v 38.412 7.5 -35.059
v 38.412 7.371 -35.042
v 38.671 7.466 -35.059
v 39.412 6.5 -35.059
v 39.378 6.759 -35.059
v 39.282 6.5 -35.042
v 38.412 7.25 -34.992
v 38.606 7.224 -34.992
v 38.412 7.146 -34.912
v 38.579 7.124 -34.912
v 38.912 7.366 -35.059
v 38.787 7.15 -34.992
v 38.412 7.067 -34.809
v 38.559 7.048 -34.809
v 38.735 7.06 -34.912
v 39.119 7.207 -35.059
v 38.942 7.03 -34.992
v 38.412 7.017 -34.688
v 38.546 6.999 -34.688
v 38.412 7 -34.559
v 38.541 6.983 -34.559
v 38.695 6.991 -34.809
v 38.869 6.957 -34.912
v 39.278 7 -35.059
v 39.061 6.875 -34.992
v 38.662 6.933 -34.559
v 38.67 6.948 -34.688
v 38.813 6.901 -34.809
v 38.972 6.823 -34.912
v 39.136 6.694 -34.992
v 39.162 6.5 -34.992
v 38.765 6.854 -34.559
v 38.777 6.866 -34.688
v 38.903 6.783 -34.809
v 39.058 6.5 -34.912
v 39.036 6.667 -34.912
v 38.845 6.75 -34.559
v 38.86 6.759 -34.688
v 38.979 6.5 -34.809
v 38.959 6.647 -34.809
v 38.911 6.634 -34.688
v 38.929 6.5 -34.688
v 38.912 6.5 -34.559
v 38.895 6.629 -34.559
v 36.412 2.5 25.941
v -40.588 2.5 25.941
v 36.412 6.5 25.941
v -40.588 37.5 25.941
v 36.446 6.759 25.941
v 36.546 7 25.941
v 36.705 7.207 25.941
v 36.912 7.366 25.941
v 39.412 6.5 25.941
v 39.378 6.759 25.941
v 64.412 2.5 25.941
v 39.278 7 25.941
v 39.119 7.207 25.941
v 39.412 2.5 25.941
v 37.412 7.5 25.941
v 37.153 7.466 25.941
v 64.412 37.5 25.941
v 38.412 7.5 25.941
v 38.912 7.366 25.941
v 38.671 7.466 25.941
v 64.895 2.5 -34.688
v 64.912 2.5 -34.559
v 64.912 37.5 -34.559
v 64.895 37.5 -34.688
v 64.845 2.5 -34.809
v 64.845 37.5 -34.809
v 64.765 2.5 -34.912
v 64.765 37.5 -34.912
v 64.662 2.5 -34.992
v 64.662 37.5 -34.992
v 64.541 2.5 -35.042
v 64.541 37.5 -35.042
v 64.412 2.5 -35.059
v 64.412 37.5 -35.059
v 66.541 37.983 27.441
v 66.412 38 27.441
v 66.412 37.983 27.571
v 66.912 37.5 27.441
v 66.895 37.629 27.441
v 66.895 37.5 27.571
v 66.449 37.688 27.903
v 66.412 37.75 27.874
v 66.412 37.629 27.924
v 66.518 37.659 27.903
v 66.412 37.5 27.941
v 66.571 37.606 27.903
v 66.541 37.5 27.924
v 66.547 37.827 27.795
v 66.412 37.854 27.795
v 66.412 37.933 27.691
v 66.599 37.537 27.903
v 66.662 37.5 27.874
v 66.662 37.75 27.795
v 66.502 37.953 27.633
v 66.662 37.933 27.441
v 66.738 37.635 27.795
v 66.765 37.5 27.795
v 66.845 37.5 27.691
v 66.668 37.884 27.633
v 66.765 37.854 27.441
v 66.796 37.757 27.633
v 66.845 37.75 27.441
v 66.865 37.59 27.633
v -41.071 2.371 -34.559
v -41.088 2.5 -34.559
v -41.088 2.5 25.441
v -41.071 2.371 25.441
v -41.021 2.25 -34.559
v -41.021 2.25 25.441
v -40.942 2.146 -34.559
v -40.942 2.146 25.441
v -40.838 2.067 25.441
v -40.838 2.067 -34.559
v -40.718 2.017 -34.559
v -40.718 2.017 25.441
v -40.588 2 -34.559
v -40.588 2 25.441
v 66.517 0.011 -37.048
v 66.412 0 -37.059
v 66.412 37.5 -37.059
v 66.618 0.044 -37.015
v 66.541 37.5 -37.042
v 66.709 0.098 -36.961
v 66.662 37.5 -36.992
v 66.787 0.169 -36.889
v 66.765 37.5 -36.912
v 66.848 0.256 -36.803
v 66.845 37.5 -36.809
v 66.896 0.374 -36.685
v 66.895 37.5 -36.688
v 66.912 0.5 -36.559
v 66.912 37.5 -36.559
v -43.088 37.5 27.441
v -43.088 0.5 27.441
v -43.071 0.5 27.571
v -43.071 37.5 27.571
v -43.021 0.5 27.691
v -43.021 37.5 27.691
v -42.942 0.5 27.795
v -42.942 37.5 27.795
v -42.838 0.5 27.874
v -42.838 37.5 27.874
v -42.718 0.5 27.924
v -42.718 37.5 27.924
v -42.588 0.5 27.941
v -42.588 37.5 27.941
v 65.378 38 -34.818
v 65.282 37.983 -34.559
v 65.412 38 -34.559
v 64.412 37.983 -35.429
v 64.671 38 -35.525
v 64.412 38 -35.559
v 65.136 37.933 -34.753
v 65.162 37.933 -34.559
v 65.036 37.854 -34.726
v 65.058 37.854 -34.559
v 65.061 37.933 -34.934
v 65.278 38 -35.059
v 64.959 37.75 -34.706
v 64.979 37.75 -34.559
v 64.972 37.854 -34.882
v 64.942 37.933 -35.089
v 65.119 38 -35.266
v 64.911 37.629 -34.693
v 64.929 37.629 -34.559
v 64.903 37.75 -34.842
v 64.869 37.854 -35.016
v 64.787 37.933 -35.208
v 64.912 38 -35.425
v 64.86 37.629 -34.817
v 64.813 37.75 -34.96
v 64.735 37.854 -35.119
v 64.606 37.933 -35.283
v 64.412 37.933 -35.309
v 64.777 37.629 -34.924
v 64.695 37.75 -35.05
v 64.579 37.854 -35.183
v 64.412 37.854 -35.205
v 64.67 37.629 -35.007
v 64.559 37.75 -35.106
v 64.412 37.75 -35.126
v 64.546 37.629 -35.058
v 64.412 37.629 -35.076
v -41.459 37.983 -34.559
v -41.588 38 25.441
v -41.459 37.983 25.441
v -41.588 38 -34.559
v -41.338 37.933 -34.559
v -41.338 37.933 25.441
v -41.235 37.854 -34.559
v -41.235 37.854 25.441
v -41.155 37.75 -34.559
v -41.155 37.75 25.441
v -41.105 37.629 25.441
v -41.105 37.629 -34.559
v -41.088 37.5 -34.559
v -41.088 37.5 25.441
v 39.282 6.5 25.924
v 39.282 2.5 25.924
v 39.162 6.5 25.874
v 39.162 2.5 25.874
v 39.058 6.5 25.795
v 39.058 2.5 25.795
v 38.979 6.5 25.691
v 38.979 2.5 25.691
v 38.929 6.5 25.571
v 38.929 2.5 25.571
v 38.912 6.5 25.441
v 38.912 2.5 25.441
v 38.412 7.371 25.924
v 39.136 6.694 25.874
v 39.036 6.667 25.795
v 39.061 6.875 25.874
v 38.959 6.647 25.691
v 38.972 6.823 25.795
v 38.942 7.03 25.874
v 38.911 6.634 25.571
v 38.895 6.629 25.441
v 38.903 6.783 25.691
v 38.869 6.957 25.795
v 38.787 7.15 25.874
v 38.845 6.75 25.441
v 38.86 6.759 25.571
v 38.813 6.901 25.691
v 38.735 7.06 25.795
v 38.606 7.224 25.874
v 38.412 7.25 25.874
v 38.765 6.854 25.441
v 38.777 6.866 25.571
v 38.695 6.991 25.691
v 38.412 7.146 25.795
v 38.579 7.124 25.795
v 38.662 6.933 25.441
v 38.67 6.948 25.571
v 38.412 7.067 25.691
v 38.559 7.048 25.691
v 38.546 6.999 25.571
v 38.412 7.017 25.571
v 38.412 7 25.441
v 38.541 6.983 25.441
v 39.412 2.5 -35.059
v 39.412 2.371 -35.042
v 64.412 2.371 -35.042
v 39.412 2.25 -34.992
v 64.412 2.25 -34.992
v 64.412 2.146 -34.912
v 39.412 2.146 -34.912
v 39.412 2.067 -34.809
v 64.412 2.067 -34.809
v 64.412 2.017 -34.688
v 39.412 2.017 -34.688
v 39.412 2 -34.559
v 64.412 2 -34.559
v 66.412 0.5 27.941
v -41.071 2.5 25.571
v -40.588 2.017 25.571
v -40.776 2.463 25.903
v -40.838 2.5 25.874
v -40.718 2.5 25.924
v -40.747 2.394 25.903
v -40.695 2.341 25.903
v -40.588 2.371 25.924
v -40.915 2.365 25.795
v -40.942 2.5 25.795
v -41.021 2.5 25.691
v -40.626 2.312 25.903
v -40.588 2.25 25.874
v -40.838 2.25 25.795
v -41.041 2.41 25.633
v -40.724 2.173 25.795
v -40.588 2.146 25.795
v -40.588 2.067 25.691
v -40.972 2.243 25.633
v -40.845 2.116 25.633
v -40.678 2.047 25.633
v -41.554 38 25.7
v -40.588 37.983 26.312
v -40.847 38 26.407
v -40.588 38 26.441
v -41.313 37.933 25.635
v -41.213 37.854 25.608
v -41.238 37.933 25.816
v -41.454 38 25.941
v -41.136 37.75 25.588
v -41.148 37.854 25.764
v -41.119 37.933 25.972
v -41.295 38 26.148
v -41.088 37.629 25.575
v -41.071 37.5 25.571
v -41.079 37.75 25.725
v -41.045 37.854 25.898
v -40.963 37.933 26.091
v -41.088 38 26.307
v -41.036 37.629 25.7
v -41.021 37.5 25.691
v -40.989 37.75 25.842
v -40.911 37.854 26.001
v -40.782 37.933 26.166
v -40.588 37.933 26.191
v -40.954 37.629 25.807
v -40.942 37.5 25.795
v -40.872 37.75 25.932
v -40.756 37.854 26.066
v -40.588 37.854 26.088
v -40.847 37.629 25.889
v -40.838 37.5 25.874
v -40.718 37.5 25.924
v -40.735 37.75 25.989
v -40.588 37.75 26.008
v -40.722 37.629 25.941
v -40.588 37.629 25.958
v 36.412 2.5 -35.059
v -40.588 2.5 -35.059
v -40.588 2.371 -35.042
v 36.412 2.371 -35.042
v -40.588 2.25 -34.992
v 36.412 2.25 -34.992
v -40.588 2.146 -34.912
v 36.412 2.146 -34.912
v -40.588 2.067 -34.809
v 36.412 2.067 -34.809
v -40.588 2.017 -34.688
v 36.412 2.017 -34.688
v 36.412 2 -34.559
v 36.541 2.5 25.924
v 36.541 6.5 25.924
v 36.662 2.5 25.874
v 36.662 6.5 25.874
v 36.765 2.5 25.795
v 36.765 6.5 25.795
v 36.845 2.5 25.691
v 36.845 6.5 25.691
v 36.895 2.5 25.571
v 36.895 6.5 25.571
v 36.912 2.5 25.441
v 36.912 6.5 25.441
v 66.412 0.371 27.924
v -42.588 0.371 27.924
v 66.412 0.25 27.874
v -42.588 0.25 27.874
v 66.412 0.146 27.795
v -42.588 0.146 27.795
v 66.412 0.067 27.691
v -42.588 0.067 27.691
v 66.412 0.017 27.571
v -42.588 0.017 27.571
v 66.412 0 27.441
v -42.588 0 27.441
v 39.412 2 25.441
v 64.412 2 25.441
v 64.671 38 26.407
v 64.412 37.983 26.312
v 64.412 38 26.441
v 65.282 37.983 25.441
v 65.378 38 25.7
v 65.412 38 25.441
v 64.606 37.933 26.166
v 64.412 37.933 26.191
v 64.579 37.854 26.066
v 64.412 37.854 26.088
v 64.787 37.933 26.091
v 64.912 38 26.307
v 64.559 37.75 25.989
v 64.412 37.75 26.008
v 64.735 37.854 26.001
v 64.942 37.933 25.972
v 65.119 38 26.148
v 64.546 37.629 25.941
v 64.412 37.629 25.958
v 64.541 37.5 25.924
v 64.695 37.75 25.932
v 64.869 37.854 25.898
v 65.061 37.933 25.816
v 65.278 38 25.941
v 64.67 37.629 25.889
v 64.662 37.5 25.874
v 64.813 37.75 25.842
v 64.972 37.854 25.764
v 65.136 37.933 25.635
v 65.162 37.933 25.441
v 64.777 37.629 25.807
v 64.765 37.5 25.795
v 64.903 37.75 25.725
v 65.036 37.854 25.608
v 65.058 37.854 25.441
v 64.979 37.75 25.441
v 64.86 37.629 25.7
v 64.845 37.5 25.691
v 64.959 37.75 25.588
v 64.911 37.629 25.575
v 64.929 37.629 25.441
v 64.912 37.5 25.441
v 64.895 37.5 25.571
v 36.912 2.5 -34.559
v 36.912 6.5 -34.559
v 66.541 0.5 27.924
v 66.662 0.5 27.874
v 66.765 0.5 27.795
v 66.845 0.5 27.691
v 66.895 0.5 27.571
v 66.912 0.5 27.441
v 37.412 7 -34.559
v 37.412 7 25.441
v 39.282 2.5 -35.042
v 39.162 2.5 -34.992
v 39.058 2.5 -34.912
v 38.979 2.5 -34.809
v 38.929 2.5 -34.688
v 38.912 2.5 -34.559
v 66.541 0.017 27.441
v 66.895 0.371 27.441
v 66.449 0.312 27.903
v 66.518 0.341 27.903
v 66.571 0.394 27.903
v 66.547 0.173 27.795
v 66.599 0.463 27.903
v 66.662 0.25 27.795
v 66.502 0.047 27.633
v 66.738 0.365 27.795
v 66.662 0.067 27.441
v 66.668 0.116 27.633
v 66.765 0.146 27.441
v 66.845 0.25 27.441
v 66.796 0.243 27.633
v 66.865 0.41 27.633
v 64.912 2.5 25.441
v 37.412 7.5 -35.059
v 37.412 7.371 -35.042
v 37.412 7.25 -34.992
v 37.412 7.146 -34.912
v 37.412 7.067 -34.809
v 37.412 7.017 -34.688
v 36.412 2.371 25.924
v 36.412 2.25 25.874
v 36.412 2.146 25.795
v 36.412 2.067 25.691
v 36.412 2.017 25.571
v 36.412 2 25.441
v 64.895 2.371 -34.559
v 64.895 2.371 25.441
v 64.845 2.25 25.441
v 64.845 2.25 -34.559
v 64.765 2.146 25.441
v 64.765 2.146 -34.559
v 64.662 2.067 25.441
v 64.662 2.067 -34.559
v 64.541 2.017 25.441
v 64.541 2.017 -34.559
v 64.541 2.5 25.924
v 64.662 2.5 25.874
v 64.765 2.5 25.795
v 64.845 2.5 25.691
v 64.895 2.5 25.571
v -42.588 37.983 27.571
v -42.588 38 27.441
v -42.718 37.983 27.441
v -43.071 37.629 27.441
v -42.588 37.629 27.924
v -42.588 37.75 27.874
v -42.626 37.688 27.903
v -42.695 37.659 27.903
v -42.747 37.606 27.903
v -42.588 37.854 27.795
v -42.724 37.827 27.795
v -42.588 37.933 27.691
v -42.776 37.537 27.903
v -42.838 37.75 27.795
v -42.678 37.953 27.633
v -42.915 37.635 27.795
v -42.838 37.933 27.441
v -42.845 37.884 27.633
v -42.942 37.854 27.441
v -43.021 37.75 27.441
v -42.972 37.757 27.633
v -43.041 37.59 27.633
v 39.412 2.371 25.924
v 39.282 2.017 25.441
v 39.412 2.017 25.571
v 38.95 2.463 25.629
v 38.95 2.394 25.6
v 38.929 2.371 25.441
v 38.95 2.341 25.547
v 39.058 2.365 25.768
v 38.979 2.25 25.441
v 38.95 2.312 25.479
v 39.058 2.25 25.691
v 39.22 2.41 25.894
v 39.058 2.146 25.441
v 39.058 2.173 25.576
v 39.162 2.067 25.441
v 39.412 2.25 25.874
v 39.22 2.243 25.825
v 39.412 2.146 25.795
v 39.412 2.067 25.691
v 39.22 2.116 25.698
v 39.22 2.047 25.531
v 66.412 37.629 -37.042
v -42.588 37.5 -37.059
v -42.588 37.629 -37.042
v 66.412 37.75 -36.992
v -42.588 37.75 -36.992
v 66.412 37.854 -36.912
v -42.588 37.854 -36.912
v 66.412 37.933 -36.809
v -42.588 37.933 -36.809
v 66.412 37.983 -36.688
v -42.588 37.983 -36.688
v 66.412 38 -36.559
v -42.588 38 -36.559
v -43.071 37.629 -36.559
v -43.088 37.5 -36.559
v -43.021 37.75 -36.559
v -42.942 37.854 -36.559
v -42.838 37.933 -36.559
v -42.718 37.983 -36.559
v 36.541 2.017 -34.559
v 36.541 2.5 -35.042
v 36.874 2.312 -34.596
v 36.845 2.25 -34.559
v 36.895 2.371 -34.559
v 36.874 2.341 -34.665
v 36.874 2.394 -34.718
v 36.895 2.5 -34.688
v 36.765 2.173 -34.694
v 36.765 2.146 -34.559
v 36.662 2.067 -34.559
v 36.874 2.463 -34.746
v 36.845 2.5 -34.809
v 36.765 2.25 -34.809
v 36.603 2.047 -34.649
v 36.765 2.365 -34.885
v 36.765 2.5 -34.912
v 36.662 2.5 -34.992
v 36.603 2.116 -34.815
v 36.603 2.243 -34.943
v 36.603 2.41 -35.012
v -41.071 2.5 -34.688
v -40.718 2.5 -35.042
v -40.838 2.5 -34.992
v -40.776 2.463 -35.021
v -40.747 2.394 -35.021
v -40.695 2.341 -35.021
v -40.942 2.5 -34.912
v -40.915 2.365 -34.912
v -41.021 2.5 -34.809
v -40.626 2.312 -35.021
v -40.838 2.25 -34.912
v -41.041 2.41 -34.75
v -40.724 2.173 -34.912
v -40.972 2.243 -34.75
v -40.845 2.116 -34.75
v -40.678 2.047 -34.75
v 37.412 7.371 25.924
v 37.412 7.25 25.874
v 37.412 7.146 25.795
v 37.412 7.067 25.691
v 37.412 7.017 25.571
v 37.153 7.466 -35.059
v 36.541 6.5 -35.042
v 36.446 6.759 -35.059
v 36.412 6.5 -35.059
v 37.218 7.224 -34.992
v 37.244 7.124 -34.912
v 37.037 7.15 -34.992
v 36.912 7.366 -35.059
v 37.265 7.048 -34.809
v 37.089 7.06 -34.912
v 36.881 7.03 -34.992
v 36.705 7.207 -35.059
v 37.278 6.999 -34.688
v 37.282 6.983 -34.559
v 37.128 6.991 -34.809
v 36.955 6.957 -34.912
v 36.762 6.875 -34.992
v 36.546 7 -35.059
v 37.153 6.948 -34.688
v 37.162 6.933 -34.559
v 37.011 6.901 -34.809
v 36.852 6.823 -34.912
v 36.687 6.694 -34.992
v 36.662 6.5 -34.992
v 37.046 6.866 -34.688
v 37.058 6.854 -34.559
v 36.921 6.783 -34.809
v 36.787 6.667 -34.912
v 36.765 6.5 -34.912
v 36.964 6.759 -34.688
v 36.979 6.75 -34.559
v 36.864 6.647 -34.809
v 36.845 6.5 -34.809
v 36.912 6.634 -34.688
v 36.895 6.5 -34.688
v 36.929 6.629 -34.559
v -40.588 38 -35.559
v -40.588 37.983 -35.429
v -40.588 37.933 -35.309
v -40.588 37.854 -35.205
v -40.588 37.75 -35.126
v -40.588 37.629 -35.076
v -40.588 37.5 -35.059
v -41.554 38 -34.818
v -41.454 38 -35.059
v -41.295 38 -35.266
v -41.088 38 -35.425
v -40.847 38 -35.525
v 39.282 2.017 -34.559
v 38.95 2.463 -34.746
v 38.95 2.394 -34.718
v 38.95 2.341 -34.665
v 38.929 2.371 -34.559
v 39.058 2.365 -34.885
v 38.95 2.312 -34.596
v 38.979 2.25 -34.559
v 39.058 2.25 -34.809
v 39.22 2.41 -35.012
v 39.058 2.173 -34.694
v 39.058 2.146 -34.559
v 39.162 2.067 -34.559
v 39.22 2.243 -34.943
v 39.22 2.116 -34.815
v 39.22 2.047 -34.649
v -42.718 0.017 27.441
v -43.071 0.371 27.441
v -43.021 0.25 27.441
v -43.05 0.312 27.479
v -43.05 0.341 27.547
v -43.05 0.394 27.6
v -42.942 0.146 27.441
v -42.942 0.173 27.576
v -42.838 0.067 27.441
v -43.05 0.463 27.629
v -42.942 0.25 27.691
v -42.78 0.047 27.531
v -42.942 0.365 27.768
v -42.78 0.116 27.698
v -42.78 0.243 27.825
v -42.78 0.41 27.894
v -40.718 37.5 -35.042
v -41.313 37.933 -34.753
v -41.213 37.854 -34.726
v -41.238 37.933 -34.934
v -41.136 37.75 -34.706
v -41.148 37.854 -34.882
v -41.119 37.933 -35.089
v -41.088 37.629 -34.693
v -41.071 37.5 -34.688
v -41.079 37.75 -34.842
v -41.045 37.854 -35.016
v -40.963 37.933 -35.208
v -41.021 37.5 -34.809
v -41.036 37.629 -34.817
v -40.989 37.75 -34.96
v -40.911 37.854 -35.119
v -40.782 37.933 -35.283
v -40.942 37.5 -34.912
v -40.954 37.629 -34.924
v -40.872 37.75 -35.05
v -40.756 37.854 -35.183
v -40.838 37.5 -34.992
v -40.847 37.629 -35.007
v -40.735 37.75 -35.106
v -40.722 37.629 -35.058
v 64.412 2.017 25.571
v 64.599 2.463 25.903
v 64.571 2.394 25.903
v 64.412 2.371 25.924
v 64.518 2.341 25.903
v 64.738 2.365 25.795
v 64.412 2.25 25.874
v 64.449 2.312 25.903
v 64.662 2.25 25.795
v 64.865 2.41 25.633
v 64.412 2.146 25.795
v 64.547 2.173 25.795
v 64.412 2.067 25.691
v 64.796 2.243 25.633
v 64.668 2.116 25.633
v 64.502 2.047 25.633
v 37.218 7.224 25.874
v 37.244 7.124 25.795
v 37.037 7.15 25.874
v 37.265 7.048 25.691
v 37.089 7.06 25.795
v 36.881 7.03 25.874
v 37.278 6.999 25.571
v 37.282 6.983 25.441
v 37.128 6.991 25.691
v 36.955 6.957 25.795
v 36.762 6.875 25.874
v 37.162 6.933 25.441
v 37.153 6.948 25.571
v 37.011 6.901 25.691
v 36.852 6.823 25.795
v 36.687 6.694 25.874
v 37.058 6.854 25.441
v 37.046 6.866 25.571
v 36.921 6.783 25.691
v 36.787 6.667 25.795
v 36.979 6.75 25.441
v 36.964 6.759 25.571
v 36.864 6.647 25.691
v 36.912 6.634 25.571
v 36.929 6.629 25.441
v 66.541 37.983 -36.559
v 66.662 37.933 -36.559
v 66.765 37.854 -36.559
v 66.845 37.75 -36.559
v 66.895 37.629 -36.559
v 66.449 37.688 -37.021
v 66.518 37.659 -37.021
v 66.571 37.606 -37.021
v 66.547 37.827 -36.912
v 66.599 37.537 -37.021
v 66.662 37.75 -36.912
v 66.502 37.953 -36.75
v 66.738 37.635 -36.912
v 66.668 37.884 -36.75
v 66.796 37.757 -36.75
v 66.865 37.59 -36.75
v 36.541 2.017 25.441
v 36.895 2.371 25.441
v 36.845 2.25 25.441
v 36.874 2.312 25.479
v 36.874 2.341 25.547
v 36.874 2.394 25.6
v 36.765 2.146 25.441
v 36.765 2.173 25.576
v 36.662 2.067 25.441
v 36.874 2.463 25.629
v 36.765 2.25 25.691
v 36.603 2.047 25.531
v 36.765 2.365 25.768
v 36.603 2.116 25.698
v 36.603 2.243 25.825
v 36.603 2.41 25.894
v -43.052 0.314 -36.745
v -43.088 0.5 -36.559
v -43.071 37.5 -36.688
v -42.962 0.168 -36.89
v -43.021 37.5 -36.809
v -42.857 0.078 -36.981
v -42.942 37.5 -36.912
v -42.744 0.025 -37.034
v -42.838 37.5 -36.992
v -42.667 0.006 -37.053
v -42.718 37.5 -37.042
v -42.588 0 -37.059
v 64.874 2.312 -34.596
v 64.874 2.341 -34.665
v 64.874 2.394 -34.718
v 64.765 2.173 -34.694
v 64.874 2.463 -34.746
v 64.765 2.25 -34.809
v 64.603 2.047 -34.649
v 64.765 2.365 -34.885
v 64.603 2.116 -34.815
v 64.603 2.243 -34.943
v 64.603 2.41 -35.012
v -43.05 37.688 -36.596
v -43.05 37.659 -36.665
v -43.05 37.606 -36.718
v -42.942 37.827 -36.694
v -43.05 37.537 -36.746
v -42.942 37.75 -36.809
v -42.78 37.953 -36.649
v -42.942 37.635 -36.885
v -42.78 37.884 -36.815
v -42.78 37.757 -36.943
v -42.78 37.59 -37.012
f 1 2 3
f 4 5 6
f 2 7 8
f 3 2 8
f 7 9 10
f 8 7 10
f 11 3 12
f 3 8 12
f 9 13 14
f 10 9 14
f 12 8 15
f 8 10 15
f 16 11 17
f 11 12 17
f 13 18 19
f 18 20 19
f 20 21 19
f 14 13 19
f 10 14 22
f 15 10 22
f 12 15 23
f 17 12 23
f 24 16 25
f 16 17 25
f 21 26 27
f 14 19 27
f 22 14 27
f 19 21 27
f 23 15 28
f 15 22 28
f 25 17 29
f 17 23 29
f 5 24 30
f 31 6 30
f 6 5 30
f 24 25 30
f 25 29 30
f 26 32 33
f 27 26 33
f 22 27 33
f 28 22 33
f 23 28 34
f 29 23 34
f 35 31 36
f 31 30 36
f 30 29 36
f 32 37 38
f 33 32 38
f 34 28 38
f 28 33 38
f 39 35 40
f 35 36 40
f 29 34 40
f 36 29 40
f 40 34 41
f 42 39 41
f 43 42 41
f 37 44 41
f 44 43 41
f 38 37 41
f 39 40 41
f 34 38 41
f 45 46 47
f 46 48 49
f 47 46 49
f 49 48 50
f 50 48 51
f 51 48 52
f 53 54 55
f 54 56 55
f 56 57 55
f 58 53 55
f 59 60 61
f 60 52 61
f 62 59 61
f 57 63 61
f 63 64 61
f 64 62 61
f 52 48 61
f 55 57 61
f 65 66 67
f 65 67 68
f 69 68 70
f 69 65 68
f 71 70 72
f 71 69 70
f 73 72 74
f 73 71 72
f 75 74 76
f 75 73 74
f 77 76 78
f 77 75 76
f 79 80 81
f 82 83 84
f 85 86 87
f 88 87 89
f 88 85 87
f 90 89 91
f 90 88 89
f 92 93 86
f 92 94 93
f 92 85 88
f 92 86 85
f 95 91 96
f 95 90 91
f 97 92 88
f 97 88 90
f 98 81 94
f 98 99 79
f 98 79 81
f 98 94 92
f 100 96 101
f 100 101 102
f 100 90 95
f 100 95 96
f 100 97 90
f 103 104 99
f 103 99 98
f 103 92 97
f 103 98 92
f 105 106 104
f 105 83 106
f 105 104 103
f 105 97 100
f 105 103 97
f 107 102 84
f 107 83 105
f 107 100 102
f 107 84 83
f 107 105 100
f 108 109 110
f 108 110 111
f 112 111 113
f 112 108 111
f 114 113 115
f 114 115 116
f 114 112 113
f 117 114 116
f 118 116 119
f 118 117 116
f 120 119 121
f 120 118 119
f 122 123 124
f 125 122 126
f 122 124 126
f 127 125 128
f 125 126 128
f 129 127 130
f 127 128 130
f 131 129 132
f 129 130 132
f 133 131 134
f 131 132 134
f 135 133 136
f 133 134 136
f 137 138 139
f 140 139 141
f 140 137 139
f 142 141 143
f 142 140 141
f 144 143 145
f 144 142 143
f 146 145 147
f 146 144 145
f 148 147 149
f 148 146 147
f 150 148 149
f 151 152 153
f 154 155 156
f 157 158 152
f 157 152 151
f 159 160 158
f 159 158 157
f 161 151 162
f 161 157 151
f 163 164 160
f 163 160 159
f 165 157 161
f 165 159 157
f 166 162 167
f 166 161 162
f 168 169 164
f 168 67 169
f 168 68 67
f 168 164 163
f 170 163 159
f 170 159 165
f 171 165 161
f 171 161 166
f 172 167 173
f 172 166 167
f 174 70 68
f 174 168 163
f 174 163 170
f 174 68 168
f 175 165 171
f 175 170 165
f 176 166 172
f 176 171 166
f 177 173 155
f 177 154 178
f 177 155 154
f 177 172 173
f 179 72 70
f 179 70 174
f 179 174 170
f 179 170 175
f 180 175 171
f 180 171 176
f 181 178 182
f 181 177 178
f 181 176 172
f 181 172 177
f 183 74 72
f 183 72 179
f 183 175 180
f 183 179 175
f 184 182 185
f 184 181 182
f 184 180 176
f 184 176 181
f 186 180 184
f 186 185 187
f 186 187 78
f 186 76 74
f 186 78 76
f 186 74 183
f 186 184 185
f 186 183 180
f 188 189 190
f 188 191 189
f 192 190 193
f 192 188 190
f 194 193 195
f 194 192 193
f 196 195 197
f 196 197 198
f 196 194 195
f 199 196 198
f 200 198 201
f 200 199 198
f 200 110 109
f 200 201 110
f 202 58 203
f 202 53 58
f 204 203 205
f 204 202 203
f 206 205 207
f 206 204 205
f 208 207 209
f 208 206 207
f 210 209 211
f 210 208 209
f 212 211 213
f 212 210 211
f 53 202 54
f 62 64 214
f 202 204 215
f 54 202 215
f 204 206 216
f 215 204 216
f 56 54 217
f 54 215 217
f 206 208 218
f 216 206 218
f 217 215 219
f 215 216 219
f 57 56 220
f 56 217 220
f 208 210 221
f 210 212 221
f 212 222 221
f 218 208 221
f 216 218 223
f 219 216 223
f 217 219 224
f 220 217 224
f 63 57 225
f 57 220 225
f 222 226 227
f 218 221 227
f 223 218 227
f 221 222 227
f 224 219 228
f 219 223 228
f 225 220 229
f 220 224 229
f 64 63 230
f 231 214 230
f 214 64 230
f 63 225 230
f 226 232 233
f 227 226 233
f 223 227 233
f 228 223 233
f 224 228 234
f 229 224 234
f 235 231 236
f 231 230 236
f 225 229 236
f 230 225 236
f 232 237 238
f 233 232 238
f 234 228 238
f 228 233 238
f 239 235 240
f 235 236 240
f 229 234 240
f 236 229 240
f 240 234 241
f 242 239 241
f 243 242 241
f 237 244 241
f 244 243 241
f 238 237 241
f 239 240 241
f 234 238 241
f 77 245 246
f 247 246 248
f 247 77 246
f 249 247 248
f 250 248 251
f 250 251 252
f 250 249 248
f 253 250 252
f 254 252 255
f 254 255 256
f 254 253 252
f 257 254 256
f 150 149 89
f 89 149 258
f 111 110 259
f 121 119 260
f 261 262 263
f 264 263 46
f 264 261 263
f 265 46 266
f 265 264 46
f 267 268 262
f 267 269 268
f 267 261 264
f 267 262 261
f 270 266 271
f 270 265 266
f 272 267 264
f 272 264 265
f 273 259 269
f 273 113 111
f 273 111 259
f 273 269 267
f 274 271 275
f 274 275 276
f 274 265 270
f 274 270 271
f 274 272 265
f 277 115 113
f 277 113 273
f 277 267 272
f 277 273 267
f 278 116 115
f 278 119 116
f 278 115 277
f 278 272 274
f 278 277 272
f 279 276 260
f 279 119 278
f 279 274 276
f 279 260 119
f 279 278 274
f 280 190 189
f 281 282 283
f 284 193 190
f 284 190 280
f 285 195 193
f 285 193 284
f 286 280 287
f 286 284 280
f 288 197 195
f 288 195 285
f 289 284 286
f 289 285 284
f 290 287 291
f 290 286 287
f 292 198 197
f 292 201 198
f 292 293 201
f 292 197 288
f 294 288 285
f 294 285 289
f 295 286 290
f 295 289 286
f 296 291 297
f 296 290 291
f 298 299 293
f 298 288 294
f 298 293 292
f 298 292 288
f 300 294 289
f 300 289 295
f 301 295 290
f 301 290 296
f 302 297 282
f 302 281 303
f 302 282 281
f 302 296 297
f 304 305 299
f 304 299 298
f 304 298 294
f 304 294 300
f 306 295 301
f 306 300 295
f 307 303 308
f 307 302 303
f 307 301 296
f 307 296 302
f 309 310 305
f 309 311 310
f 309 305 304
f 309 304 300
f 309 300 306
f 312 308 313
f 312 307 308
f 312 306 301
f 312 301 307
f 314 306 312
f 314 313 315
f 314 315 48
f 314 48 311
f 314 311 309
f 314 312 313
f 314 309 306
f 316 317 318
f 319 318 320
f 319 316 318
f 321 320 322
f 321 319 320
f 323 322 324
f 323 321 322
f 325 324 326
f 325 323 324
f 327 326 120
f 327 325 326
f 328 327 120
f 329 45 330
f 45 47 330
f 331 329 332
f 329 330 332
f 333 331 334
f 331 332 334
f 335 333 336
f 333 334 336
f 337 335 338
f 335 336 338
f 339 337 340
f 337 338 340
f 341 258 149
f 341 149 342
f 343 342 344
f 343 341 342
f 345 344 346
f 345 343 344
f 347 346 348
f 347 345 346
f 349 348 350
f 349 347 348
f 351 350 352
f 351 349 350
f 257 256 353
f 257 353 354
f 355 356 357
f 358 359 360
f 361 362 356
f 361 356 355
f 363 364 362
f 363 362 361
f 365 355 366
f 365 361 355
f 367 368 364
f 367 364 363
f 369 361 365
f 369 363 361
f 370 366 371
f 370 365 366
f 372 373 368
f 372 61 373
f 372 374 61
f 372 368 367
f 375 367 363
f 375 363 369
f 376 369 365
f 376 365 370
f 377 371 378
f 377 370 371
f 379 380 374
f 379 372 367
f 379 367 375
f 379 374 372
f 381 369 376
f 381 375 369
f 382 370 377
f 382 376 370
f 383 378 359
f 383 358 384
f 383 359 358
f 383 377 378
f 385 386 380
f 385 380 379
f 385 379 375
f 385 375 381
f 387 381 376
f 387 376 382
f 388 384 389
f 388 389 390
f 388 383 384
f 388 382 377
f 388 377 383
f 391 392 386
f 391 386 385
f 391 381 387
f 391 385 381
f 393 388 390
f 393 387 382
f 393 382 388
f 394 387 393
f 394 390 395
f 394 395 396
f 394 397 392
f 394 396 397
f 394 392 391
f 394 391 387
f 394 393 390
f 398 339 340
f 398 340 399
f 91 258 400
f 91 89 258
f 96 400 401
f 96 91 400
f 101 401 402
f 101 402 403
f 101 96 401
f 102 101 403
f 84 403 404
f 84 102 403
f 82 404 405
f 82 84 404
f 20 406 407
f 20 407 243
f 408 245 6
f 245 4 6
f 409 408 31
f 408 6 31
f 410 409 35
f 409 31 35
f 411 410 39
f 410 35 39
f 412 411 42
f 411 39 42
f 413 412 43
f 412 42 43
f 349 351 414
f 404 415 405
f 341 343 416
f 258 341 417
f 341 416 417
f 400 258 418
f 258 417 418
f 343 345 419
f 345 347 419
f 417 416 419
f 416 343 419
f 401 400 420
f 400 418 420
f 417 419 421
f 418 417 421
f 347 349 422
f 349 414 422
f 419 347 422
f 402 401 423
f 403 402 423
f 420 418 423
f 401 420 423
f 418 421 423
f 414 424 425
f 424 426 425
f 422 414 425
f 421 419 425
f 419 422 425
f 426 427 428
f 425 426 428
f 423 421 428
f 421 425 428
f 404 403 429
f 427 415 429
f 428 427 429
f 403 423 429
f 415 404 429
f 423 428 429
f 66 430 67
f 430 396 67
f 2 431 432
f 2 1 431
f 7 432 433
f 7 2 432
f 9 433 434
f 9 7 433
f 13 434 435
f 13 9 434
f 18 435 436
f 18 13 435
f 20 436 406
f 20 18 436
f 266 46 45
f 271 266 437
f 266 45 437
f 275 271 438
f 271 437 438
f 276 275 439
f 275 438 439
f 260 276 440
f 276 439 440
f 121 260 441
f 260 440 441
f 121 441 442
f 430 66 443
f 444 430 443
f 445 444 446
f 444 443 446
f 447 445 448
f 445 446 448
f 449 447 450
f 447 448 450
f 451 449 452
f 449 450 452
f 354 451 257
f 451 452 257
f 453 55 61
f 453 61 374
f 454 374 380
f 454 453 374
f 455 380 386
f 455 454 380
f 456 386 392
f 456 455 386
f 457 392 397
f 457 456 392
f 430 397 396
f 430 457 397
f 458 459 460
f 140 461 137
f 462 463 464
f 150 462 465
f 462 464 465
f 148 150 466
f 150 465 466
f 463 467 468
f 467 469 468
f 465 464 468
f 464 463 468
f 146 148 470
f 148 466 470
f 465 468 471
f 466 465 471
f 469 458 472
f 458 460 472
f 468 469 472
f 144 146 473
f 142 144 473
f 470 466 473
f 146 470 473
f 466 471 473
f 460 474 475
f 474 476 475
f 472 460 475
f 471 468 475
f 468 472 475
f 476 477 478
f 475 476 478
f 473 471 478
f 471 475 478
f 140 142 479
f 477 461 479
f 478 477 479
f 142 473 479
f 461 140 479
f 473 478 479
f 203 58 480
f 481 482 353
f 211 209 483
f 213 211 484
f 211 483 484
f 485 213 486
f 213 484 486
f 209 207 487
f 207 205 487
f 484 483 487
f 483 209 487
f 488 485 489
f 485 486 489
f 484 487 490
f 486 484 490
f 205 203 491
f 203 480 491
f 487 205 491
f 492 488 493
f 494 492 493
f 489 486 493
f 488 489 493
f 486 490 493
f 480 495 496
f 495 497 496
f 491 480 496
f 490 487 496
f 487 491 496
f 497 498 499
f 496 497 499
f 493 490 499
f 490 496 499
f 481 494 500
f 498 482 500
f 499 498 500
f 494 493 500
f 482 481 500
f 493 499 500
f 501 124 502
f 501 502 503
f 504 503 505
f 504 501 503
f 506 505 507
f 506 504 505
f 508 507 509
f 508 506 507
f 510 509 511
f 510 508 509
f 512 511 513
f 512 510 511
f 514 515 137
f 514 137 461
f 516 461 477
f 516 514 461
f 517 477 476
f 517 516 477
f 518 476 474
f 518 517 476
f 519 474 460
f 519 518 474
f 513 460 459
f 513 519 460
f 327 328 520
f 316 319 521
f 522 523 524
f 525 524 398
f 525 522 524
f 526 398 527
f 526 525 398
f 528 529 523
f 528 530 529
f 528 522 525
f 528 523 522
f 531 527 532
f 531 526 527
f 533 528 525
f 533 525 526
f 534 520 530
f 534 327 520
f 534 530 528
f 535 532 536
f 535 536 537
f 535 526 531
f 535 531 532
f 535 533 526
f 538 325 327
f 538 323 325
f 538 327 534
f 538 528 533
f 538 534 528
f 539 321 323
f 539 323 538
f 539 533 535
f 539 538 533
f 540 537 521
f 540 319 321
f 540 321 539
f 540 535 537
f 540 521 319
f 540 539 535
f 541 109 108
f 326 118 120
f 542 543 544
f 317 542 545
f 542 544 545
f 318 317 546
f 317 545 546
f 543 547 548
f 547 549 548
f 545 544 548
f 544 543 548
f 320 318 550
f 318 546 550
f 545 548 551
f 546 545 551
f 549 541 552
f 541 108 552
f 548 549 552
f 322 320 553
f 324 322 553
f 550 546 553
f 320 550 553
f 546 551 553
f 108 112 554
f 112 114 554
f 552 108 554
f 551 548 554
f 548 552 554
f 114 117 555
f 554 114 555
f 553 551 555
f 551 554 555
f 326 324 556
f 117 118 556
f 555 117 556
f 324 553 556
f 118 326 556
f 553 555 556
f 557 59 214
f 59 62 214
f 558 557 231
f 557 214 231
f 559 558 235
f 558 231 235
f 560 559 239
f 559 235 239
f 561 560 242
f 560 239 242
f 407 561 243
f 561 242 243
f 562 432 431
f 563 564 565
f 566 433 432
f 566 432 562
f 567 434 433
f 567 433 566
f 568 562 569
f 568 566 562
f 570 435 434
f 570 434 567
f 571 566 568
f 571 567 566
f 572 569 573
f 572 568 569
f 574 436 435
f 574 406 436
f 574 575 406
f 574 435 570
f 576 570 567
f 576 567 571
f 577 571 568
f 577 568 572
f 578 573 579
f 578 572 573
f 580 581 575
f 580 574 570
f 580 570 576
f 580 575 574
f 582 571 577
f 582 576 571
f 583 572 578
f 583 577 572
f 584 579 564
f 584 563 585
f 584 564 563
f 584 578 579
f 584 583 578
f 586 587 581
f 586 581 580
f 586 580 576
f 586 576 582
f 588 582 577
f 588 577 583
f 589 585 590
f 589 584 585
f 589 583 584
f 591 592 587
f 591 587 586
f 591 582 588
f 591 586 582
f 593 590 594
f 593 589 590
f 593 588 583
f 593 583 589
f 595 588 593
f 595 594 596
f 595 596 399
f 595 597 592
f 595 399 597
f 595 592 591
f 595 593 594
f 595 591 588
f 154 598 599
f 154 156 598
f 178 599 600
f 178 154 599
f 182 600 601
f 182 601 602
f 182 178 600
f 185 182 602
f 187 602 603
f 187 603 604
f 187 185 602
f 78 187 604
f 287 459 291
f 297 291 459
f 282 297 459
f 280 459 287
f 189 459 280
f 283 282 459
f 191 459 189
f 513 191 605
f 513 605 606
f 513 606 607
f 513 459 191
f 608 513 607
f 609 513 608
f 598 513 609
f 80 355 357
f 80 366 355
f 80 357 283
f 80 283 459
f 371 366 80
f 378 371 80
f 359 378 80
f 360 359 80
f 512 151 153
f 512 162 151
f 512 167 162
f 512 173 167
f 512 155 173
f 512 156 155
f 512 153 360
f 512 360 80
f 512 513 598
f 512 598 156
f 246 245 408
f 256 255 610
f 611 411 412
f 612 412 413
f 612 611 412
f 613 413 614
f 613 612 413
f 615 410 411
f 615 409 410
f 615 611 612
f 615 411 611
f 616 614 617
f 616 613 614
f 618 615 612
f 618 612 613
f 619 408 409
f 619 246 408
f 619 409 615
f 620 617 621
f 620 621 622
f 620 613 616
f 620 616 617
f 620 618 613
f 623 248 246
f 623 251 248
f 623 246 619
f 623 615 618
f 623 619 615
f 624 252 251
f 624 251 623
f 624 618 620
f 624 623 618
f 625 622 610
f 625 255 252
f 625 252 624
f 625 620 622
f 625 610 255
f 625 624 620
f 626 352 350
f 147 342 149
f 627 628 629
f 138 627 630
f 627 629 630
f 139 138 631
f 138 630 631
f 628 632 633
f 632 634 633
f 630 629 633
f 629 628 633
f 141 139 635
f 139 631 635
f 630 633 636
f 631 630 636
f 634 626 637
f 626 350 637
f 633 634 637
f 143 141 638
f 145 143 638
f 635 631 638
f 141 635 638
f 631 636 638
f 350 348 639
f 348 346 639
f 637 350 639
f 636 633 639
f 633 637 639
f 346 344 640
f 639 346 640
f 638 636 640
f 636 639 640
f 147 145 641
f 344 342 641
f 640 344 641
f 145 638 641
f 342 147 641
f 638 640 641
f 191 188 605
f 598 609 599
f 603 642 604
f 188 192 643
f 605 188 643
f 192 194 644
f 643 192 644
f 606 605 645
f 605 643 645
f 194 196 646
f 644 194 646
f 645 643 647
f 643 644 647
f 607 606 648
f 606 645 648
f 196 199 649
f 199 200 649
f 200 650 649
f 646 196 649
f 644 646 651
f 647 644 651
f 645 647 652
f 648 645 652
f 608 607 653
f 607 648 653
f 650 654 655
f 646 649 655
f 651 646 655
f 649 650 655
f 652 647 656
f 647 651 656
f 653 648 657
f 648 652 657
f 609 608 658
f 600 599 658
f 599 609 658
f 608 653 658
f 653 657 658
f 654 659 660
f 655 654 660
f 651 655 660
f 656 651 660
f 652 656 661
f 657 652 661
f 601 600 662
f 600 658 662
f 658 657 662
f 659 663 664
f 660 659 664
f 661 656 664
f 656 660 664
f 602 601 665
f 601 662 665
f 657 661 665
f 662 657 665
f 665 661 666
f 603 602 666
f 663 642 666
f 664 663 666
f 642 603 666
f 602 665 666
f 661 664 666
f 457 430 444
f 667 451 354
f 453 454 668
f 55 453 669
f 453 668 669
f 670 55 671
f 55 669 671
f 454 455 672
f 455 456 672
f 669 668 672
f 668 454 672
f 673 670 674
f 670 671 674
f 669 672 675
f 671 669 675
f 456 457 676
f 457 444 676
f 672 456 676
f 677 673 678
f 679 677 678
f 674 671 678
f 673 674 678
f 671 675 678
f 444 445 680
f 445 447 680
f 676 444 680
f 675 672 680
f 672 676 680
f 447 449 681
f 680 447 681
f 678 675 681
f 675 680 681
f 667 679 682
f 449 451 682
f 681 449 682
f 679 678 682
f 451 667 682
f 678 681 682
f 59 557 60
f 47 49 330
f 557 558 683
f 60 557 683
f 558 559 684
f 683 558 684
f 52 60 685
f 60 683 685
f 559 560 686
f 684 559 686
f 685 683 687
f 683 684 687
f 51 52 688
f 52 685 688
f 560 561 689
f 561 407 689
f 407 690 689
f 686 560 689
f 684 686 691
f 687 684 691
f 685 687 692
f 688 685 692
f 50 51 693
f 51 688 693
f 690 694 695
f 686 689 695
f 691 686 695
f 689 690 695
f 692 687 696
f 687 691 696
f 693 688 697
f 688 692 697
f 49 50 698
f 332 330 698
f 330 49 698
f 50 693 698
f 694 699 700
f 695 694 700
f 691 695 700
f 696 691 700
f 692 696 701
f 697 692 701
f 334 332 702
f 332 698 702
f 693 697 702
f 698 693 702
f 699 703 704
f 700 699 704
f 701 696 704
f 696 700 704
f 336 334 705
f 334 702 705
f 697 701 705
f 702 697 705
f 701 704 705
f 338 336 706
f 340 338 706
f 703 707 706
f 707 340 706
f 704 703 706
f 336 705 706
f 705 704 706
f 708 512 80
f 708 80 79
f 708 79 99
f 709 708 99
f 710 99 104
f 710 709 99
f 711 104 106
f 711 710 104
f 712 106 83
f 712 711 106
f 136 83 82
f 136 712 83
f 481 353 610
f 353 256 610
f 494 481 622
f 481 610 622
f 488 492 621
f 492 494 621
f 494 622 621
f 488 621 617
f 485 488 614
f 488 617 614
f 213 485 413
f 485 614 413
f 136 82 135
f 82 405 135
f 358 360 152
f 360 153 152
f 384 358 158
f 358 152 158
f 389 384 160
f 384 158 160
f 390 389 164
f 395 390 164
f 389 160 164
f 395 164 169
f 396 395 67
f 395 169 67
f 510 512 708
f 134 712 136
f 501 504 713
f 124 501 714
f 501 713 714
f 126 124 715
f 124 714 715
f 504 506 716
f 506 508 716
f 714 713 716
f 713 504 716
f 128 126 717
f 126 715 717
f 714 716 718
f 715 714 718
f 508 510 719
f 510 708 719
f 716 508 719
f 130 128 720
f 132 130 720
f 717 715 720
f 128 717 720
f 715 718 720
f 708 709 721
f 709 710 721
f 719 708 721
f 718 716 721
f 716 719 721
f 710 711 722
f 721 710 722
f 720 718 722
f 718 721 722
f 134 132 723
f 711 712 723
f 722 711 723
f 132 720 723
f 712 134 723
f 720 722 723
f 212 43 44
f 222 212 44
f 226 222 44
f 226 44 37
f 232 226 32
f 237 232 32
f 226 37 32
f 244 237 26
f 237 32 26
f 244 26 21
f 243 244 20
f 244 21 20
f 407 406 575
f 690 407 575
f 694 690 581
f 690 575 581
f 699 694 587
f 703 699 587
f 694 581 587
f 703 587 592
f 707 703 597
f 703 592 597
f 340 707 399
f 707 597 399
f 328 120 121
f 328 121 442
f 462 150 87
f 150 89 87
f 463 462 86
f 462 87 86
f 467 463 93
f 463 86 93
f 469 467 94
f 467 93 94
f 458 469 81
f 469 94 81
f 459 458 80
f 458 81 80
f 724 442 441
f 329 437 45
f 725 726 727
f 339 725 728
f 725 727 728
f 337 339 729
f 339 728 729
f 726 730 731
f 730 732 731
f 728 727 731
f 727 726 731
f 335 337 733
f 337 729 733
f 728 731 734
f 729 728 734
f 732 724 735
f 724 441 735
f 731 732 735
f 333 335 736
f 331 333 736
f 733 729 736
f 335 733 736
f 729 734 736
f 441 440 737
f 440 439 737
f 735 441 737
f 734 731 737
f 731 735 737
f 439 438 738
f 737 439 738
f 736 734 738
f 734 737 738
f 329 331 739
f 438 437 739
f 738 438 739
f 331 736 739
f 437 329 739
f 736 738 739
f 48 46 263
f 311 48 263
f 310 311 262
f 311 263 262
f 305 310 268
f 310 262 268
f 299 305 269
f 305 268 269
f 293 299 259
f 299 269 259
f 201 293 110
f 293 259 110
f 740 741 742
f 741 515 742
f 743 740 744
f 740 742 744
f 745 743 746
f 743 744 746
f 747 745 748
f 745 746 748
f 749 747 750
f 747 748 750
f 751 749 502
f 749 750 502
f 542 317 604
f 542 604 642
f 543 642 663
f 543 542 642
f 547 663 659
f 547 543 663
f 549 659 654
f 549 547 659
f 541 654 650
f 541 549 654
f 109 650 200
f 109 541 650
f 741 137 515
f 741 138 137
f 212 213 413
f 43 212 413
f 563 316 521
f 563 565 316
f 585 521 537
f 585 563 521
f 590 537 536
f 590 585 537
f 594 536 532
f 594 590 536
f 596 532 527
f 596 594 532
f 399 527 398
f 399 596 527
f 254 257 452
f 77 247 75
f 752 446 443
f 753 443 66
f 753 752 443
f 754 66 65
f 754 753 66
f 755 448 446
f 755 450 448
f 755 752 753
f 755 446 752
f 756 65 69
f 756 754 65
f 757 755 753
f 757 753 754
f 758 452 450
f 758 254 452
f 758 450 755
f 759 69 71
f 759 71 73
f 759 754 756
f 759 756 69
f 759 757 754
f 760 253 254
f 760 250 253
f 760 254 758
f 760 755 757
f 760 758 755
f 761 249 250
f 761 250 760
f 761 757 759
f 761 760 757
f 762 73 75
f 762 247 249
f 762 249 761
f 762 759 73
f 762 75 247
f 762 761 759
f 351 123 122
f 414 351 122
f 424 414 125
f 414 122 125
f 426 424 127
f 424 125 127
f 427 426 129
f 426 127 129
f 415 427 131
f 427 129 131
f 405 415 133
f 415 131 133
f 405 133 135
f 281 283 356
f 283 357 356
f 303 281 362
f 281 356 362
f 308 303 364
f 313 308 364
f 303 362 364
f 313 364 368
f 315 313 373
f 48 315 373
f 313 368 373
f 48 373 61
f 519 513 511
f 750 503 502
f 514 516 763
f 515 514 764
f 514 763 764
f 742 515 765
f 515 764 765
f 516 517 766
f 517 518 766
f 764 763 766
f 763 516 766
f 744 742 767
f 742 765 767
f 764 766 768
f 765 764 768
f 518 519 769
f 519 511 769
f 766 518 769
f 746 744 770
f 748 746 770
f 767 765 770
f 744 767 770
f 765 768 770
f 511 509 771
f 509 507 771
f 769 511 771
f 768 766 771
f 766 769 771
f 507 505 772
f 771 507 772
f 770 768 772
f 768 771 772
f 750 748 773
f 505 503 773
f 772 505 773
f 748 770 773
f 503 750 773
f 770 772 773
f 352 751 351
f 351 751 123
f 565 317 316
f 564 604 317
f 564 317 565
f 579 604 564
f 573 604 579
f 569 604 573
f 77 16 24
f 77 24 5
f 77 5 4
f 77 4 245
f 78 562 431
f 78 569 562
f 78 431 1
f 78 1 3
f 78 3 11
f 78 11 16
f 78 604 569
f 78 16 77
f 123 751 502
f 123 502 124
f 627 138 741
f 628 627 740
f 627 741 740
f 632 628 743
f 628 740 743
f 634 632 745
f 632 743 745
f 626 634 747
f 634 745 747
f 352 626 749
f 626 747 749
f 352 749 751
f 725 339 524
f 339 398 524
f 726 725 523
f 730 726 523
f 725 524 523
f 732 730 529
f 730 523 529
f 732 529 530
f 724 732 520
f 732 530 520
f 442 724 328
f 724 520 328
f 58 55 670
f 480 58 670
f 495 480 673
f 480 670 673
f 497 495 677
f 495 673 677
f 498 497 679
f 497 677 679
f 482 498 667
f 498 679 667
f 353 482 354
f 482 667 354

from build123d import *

# Parameters (mm, degrees)
SKETCH1_W           = 110
SKETCH1_H           = 65
BOSS_EXTRUDE1_DEPTH = 38
SKETCH2_W           = 106
SKETCH2_H           = 61
CUT_EXTRUDE1_DEPTH  = 36
SKETCH3_W           = 2
SKETCH3_H           = 61
BOSS_EXTRUDE2_DEPTH = 5
FILLET4_R           = 0.5


with BuildPart() as part:
    # Sketch1 → Boss-Extrude1 (new body)
    with BuildSketch(Plane(origin=(0, 0, 0), x_dir=(1, 0, 0), z_dir=(0, 1, 0))):
        with Locations((11.911764706, 4.558823529)):
            Rectangle(SKETCH1_W, SKETCH1_H)
    extrude(amount=BOSS_EXTRUDE1_DEPTH)

    # Sketch2 → Cut-Extrude1 (cut)
    with BuildSketch(Plane(origin=(0, 38, 0), x_dir=(1, 0, 0), z_dir=(0, 1, 0))):
        with Locations((11.911764706, 4.558823529)):
            Rectangle(SKETCH2_W, SKETCH2_H)
    extrude(amount=-CUT_EXTRUDE1_DEPTH, mode=Mode.SUBTRACT)

    # Sketch3 → Boss-Extrude2 (add)
    with BuildSketch(Plane(origin=(0, 2, 0), x_dir=(1, 0, 0), z_dir=(0, 1, 0))):
        with Locations((37.911764706, 4.558823529)):
            Rectangle(SKETCH3_W, SKETCH3_H)
    extrude(amount=BOSS_EXTRUDE2_DEPTH)

    # Fillet4
    fillet4_edges = [part.edges().sort_by_distance(p)[0] for p in [
        (66.911764706, 38, -4.558823529),
        (11.911764706, 38, -37.058823529),
        (-41.088235294, 2, -4.558823529),
        (-41.088235294, 20, 25.941176471),
        (51.911764706, 2, -35.058823529),
        (-41.088235294, 20, -35.058823529),
        (64.911764706, 2, -4.558823529),
        (64.911764706, 20, -35.058823529),
        (-2.088235294, 2, 25.941176471),
        (64.911764706, 20, 25.941176471),
        (-41.088235294, 38, -4.558823529),
        (11.911764706, 38, 25.941176471),
        (64.911764706, 38, -4.558823529),
        (11.911764706, 38, -35.058823529),
        (51.911764706, 2, 25.941176471),
        (-2.088235294, 2, -35.058823529),
        (37.911764706, 7, -35.058823529),
        (38.911764706, 4.5, -35.058823529),
        (36.911764706, 2, -4.558823529),
        (36.911764706, 4.5, -35.058823529),
        (36.911764706, 4.5, 25.941176471),
        (38.911764706, 7, -4.558823529),
        (38.911764706, 4.5, 25.941176471),
        (36.911764706, 7, -4.558823529),
        (37.911764706, 7, 25.941176471),
        (38.911764706, 2, -4.558823529),
        (-43.088235294, 38, -4.558823529),
        (66.911764706, 0, -4.558823529),
        (11.911764706, 0, 27.941176471),
        (-43.088235294, 0, -4.558823529),
        (11.911764706, 38, 27.941176471),
        (-43.088235294, 19, -37.058823529),
        (66.911764706, 19, -37.058823529),
        (66.911764706, 19, 27.941176471),
        (-43.088235294, 19, 27.941176471),
    ]]
    fillet(fillet4_edges, radius=FILLET4_R)


solid = part.part
